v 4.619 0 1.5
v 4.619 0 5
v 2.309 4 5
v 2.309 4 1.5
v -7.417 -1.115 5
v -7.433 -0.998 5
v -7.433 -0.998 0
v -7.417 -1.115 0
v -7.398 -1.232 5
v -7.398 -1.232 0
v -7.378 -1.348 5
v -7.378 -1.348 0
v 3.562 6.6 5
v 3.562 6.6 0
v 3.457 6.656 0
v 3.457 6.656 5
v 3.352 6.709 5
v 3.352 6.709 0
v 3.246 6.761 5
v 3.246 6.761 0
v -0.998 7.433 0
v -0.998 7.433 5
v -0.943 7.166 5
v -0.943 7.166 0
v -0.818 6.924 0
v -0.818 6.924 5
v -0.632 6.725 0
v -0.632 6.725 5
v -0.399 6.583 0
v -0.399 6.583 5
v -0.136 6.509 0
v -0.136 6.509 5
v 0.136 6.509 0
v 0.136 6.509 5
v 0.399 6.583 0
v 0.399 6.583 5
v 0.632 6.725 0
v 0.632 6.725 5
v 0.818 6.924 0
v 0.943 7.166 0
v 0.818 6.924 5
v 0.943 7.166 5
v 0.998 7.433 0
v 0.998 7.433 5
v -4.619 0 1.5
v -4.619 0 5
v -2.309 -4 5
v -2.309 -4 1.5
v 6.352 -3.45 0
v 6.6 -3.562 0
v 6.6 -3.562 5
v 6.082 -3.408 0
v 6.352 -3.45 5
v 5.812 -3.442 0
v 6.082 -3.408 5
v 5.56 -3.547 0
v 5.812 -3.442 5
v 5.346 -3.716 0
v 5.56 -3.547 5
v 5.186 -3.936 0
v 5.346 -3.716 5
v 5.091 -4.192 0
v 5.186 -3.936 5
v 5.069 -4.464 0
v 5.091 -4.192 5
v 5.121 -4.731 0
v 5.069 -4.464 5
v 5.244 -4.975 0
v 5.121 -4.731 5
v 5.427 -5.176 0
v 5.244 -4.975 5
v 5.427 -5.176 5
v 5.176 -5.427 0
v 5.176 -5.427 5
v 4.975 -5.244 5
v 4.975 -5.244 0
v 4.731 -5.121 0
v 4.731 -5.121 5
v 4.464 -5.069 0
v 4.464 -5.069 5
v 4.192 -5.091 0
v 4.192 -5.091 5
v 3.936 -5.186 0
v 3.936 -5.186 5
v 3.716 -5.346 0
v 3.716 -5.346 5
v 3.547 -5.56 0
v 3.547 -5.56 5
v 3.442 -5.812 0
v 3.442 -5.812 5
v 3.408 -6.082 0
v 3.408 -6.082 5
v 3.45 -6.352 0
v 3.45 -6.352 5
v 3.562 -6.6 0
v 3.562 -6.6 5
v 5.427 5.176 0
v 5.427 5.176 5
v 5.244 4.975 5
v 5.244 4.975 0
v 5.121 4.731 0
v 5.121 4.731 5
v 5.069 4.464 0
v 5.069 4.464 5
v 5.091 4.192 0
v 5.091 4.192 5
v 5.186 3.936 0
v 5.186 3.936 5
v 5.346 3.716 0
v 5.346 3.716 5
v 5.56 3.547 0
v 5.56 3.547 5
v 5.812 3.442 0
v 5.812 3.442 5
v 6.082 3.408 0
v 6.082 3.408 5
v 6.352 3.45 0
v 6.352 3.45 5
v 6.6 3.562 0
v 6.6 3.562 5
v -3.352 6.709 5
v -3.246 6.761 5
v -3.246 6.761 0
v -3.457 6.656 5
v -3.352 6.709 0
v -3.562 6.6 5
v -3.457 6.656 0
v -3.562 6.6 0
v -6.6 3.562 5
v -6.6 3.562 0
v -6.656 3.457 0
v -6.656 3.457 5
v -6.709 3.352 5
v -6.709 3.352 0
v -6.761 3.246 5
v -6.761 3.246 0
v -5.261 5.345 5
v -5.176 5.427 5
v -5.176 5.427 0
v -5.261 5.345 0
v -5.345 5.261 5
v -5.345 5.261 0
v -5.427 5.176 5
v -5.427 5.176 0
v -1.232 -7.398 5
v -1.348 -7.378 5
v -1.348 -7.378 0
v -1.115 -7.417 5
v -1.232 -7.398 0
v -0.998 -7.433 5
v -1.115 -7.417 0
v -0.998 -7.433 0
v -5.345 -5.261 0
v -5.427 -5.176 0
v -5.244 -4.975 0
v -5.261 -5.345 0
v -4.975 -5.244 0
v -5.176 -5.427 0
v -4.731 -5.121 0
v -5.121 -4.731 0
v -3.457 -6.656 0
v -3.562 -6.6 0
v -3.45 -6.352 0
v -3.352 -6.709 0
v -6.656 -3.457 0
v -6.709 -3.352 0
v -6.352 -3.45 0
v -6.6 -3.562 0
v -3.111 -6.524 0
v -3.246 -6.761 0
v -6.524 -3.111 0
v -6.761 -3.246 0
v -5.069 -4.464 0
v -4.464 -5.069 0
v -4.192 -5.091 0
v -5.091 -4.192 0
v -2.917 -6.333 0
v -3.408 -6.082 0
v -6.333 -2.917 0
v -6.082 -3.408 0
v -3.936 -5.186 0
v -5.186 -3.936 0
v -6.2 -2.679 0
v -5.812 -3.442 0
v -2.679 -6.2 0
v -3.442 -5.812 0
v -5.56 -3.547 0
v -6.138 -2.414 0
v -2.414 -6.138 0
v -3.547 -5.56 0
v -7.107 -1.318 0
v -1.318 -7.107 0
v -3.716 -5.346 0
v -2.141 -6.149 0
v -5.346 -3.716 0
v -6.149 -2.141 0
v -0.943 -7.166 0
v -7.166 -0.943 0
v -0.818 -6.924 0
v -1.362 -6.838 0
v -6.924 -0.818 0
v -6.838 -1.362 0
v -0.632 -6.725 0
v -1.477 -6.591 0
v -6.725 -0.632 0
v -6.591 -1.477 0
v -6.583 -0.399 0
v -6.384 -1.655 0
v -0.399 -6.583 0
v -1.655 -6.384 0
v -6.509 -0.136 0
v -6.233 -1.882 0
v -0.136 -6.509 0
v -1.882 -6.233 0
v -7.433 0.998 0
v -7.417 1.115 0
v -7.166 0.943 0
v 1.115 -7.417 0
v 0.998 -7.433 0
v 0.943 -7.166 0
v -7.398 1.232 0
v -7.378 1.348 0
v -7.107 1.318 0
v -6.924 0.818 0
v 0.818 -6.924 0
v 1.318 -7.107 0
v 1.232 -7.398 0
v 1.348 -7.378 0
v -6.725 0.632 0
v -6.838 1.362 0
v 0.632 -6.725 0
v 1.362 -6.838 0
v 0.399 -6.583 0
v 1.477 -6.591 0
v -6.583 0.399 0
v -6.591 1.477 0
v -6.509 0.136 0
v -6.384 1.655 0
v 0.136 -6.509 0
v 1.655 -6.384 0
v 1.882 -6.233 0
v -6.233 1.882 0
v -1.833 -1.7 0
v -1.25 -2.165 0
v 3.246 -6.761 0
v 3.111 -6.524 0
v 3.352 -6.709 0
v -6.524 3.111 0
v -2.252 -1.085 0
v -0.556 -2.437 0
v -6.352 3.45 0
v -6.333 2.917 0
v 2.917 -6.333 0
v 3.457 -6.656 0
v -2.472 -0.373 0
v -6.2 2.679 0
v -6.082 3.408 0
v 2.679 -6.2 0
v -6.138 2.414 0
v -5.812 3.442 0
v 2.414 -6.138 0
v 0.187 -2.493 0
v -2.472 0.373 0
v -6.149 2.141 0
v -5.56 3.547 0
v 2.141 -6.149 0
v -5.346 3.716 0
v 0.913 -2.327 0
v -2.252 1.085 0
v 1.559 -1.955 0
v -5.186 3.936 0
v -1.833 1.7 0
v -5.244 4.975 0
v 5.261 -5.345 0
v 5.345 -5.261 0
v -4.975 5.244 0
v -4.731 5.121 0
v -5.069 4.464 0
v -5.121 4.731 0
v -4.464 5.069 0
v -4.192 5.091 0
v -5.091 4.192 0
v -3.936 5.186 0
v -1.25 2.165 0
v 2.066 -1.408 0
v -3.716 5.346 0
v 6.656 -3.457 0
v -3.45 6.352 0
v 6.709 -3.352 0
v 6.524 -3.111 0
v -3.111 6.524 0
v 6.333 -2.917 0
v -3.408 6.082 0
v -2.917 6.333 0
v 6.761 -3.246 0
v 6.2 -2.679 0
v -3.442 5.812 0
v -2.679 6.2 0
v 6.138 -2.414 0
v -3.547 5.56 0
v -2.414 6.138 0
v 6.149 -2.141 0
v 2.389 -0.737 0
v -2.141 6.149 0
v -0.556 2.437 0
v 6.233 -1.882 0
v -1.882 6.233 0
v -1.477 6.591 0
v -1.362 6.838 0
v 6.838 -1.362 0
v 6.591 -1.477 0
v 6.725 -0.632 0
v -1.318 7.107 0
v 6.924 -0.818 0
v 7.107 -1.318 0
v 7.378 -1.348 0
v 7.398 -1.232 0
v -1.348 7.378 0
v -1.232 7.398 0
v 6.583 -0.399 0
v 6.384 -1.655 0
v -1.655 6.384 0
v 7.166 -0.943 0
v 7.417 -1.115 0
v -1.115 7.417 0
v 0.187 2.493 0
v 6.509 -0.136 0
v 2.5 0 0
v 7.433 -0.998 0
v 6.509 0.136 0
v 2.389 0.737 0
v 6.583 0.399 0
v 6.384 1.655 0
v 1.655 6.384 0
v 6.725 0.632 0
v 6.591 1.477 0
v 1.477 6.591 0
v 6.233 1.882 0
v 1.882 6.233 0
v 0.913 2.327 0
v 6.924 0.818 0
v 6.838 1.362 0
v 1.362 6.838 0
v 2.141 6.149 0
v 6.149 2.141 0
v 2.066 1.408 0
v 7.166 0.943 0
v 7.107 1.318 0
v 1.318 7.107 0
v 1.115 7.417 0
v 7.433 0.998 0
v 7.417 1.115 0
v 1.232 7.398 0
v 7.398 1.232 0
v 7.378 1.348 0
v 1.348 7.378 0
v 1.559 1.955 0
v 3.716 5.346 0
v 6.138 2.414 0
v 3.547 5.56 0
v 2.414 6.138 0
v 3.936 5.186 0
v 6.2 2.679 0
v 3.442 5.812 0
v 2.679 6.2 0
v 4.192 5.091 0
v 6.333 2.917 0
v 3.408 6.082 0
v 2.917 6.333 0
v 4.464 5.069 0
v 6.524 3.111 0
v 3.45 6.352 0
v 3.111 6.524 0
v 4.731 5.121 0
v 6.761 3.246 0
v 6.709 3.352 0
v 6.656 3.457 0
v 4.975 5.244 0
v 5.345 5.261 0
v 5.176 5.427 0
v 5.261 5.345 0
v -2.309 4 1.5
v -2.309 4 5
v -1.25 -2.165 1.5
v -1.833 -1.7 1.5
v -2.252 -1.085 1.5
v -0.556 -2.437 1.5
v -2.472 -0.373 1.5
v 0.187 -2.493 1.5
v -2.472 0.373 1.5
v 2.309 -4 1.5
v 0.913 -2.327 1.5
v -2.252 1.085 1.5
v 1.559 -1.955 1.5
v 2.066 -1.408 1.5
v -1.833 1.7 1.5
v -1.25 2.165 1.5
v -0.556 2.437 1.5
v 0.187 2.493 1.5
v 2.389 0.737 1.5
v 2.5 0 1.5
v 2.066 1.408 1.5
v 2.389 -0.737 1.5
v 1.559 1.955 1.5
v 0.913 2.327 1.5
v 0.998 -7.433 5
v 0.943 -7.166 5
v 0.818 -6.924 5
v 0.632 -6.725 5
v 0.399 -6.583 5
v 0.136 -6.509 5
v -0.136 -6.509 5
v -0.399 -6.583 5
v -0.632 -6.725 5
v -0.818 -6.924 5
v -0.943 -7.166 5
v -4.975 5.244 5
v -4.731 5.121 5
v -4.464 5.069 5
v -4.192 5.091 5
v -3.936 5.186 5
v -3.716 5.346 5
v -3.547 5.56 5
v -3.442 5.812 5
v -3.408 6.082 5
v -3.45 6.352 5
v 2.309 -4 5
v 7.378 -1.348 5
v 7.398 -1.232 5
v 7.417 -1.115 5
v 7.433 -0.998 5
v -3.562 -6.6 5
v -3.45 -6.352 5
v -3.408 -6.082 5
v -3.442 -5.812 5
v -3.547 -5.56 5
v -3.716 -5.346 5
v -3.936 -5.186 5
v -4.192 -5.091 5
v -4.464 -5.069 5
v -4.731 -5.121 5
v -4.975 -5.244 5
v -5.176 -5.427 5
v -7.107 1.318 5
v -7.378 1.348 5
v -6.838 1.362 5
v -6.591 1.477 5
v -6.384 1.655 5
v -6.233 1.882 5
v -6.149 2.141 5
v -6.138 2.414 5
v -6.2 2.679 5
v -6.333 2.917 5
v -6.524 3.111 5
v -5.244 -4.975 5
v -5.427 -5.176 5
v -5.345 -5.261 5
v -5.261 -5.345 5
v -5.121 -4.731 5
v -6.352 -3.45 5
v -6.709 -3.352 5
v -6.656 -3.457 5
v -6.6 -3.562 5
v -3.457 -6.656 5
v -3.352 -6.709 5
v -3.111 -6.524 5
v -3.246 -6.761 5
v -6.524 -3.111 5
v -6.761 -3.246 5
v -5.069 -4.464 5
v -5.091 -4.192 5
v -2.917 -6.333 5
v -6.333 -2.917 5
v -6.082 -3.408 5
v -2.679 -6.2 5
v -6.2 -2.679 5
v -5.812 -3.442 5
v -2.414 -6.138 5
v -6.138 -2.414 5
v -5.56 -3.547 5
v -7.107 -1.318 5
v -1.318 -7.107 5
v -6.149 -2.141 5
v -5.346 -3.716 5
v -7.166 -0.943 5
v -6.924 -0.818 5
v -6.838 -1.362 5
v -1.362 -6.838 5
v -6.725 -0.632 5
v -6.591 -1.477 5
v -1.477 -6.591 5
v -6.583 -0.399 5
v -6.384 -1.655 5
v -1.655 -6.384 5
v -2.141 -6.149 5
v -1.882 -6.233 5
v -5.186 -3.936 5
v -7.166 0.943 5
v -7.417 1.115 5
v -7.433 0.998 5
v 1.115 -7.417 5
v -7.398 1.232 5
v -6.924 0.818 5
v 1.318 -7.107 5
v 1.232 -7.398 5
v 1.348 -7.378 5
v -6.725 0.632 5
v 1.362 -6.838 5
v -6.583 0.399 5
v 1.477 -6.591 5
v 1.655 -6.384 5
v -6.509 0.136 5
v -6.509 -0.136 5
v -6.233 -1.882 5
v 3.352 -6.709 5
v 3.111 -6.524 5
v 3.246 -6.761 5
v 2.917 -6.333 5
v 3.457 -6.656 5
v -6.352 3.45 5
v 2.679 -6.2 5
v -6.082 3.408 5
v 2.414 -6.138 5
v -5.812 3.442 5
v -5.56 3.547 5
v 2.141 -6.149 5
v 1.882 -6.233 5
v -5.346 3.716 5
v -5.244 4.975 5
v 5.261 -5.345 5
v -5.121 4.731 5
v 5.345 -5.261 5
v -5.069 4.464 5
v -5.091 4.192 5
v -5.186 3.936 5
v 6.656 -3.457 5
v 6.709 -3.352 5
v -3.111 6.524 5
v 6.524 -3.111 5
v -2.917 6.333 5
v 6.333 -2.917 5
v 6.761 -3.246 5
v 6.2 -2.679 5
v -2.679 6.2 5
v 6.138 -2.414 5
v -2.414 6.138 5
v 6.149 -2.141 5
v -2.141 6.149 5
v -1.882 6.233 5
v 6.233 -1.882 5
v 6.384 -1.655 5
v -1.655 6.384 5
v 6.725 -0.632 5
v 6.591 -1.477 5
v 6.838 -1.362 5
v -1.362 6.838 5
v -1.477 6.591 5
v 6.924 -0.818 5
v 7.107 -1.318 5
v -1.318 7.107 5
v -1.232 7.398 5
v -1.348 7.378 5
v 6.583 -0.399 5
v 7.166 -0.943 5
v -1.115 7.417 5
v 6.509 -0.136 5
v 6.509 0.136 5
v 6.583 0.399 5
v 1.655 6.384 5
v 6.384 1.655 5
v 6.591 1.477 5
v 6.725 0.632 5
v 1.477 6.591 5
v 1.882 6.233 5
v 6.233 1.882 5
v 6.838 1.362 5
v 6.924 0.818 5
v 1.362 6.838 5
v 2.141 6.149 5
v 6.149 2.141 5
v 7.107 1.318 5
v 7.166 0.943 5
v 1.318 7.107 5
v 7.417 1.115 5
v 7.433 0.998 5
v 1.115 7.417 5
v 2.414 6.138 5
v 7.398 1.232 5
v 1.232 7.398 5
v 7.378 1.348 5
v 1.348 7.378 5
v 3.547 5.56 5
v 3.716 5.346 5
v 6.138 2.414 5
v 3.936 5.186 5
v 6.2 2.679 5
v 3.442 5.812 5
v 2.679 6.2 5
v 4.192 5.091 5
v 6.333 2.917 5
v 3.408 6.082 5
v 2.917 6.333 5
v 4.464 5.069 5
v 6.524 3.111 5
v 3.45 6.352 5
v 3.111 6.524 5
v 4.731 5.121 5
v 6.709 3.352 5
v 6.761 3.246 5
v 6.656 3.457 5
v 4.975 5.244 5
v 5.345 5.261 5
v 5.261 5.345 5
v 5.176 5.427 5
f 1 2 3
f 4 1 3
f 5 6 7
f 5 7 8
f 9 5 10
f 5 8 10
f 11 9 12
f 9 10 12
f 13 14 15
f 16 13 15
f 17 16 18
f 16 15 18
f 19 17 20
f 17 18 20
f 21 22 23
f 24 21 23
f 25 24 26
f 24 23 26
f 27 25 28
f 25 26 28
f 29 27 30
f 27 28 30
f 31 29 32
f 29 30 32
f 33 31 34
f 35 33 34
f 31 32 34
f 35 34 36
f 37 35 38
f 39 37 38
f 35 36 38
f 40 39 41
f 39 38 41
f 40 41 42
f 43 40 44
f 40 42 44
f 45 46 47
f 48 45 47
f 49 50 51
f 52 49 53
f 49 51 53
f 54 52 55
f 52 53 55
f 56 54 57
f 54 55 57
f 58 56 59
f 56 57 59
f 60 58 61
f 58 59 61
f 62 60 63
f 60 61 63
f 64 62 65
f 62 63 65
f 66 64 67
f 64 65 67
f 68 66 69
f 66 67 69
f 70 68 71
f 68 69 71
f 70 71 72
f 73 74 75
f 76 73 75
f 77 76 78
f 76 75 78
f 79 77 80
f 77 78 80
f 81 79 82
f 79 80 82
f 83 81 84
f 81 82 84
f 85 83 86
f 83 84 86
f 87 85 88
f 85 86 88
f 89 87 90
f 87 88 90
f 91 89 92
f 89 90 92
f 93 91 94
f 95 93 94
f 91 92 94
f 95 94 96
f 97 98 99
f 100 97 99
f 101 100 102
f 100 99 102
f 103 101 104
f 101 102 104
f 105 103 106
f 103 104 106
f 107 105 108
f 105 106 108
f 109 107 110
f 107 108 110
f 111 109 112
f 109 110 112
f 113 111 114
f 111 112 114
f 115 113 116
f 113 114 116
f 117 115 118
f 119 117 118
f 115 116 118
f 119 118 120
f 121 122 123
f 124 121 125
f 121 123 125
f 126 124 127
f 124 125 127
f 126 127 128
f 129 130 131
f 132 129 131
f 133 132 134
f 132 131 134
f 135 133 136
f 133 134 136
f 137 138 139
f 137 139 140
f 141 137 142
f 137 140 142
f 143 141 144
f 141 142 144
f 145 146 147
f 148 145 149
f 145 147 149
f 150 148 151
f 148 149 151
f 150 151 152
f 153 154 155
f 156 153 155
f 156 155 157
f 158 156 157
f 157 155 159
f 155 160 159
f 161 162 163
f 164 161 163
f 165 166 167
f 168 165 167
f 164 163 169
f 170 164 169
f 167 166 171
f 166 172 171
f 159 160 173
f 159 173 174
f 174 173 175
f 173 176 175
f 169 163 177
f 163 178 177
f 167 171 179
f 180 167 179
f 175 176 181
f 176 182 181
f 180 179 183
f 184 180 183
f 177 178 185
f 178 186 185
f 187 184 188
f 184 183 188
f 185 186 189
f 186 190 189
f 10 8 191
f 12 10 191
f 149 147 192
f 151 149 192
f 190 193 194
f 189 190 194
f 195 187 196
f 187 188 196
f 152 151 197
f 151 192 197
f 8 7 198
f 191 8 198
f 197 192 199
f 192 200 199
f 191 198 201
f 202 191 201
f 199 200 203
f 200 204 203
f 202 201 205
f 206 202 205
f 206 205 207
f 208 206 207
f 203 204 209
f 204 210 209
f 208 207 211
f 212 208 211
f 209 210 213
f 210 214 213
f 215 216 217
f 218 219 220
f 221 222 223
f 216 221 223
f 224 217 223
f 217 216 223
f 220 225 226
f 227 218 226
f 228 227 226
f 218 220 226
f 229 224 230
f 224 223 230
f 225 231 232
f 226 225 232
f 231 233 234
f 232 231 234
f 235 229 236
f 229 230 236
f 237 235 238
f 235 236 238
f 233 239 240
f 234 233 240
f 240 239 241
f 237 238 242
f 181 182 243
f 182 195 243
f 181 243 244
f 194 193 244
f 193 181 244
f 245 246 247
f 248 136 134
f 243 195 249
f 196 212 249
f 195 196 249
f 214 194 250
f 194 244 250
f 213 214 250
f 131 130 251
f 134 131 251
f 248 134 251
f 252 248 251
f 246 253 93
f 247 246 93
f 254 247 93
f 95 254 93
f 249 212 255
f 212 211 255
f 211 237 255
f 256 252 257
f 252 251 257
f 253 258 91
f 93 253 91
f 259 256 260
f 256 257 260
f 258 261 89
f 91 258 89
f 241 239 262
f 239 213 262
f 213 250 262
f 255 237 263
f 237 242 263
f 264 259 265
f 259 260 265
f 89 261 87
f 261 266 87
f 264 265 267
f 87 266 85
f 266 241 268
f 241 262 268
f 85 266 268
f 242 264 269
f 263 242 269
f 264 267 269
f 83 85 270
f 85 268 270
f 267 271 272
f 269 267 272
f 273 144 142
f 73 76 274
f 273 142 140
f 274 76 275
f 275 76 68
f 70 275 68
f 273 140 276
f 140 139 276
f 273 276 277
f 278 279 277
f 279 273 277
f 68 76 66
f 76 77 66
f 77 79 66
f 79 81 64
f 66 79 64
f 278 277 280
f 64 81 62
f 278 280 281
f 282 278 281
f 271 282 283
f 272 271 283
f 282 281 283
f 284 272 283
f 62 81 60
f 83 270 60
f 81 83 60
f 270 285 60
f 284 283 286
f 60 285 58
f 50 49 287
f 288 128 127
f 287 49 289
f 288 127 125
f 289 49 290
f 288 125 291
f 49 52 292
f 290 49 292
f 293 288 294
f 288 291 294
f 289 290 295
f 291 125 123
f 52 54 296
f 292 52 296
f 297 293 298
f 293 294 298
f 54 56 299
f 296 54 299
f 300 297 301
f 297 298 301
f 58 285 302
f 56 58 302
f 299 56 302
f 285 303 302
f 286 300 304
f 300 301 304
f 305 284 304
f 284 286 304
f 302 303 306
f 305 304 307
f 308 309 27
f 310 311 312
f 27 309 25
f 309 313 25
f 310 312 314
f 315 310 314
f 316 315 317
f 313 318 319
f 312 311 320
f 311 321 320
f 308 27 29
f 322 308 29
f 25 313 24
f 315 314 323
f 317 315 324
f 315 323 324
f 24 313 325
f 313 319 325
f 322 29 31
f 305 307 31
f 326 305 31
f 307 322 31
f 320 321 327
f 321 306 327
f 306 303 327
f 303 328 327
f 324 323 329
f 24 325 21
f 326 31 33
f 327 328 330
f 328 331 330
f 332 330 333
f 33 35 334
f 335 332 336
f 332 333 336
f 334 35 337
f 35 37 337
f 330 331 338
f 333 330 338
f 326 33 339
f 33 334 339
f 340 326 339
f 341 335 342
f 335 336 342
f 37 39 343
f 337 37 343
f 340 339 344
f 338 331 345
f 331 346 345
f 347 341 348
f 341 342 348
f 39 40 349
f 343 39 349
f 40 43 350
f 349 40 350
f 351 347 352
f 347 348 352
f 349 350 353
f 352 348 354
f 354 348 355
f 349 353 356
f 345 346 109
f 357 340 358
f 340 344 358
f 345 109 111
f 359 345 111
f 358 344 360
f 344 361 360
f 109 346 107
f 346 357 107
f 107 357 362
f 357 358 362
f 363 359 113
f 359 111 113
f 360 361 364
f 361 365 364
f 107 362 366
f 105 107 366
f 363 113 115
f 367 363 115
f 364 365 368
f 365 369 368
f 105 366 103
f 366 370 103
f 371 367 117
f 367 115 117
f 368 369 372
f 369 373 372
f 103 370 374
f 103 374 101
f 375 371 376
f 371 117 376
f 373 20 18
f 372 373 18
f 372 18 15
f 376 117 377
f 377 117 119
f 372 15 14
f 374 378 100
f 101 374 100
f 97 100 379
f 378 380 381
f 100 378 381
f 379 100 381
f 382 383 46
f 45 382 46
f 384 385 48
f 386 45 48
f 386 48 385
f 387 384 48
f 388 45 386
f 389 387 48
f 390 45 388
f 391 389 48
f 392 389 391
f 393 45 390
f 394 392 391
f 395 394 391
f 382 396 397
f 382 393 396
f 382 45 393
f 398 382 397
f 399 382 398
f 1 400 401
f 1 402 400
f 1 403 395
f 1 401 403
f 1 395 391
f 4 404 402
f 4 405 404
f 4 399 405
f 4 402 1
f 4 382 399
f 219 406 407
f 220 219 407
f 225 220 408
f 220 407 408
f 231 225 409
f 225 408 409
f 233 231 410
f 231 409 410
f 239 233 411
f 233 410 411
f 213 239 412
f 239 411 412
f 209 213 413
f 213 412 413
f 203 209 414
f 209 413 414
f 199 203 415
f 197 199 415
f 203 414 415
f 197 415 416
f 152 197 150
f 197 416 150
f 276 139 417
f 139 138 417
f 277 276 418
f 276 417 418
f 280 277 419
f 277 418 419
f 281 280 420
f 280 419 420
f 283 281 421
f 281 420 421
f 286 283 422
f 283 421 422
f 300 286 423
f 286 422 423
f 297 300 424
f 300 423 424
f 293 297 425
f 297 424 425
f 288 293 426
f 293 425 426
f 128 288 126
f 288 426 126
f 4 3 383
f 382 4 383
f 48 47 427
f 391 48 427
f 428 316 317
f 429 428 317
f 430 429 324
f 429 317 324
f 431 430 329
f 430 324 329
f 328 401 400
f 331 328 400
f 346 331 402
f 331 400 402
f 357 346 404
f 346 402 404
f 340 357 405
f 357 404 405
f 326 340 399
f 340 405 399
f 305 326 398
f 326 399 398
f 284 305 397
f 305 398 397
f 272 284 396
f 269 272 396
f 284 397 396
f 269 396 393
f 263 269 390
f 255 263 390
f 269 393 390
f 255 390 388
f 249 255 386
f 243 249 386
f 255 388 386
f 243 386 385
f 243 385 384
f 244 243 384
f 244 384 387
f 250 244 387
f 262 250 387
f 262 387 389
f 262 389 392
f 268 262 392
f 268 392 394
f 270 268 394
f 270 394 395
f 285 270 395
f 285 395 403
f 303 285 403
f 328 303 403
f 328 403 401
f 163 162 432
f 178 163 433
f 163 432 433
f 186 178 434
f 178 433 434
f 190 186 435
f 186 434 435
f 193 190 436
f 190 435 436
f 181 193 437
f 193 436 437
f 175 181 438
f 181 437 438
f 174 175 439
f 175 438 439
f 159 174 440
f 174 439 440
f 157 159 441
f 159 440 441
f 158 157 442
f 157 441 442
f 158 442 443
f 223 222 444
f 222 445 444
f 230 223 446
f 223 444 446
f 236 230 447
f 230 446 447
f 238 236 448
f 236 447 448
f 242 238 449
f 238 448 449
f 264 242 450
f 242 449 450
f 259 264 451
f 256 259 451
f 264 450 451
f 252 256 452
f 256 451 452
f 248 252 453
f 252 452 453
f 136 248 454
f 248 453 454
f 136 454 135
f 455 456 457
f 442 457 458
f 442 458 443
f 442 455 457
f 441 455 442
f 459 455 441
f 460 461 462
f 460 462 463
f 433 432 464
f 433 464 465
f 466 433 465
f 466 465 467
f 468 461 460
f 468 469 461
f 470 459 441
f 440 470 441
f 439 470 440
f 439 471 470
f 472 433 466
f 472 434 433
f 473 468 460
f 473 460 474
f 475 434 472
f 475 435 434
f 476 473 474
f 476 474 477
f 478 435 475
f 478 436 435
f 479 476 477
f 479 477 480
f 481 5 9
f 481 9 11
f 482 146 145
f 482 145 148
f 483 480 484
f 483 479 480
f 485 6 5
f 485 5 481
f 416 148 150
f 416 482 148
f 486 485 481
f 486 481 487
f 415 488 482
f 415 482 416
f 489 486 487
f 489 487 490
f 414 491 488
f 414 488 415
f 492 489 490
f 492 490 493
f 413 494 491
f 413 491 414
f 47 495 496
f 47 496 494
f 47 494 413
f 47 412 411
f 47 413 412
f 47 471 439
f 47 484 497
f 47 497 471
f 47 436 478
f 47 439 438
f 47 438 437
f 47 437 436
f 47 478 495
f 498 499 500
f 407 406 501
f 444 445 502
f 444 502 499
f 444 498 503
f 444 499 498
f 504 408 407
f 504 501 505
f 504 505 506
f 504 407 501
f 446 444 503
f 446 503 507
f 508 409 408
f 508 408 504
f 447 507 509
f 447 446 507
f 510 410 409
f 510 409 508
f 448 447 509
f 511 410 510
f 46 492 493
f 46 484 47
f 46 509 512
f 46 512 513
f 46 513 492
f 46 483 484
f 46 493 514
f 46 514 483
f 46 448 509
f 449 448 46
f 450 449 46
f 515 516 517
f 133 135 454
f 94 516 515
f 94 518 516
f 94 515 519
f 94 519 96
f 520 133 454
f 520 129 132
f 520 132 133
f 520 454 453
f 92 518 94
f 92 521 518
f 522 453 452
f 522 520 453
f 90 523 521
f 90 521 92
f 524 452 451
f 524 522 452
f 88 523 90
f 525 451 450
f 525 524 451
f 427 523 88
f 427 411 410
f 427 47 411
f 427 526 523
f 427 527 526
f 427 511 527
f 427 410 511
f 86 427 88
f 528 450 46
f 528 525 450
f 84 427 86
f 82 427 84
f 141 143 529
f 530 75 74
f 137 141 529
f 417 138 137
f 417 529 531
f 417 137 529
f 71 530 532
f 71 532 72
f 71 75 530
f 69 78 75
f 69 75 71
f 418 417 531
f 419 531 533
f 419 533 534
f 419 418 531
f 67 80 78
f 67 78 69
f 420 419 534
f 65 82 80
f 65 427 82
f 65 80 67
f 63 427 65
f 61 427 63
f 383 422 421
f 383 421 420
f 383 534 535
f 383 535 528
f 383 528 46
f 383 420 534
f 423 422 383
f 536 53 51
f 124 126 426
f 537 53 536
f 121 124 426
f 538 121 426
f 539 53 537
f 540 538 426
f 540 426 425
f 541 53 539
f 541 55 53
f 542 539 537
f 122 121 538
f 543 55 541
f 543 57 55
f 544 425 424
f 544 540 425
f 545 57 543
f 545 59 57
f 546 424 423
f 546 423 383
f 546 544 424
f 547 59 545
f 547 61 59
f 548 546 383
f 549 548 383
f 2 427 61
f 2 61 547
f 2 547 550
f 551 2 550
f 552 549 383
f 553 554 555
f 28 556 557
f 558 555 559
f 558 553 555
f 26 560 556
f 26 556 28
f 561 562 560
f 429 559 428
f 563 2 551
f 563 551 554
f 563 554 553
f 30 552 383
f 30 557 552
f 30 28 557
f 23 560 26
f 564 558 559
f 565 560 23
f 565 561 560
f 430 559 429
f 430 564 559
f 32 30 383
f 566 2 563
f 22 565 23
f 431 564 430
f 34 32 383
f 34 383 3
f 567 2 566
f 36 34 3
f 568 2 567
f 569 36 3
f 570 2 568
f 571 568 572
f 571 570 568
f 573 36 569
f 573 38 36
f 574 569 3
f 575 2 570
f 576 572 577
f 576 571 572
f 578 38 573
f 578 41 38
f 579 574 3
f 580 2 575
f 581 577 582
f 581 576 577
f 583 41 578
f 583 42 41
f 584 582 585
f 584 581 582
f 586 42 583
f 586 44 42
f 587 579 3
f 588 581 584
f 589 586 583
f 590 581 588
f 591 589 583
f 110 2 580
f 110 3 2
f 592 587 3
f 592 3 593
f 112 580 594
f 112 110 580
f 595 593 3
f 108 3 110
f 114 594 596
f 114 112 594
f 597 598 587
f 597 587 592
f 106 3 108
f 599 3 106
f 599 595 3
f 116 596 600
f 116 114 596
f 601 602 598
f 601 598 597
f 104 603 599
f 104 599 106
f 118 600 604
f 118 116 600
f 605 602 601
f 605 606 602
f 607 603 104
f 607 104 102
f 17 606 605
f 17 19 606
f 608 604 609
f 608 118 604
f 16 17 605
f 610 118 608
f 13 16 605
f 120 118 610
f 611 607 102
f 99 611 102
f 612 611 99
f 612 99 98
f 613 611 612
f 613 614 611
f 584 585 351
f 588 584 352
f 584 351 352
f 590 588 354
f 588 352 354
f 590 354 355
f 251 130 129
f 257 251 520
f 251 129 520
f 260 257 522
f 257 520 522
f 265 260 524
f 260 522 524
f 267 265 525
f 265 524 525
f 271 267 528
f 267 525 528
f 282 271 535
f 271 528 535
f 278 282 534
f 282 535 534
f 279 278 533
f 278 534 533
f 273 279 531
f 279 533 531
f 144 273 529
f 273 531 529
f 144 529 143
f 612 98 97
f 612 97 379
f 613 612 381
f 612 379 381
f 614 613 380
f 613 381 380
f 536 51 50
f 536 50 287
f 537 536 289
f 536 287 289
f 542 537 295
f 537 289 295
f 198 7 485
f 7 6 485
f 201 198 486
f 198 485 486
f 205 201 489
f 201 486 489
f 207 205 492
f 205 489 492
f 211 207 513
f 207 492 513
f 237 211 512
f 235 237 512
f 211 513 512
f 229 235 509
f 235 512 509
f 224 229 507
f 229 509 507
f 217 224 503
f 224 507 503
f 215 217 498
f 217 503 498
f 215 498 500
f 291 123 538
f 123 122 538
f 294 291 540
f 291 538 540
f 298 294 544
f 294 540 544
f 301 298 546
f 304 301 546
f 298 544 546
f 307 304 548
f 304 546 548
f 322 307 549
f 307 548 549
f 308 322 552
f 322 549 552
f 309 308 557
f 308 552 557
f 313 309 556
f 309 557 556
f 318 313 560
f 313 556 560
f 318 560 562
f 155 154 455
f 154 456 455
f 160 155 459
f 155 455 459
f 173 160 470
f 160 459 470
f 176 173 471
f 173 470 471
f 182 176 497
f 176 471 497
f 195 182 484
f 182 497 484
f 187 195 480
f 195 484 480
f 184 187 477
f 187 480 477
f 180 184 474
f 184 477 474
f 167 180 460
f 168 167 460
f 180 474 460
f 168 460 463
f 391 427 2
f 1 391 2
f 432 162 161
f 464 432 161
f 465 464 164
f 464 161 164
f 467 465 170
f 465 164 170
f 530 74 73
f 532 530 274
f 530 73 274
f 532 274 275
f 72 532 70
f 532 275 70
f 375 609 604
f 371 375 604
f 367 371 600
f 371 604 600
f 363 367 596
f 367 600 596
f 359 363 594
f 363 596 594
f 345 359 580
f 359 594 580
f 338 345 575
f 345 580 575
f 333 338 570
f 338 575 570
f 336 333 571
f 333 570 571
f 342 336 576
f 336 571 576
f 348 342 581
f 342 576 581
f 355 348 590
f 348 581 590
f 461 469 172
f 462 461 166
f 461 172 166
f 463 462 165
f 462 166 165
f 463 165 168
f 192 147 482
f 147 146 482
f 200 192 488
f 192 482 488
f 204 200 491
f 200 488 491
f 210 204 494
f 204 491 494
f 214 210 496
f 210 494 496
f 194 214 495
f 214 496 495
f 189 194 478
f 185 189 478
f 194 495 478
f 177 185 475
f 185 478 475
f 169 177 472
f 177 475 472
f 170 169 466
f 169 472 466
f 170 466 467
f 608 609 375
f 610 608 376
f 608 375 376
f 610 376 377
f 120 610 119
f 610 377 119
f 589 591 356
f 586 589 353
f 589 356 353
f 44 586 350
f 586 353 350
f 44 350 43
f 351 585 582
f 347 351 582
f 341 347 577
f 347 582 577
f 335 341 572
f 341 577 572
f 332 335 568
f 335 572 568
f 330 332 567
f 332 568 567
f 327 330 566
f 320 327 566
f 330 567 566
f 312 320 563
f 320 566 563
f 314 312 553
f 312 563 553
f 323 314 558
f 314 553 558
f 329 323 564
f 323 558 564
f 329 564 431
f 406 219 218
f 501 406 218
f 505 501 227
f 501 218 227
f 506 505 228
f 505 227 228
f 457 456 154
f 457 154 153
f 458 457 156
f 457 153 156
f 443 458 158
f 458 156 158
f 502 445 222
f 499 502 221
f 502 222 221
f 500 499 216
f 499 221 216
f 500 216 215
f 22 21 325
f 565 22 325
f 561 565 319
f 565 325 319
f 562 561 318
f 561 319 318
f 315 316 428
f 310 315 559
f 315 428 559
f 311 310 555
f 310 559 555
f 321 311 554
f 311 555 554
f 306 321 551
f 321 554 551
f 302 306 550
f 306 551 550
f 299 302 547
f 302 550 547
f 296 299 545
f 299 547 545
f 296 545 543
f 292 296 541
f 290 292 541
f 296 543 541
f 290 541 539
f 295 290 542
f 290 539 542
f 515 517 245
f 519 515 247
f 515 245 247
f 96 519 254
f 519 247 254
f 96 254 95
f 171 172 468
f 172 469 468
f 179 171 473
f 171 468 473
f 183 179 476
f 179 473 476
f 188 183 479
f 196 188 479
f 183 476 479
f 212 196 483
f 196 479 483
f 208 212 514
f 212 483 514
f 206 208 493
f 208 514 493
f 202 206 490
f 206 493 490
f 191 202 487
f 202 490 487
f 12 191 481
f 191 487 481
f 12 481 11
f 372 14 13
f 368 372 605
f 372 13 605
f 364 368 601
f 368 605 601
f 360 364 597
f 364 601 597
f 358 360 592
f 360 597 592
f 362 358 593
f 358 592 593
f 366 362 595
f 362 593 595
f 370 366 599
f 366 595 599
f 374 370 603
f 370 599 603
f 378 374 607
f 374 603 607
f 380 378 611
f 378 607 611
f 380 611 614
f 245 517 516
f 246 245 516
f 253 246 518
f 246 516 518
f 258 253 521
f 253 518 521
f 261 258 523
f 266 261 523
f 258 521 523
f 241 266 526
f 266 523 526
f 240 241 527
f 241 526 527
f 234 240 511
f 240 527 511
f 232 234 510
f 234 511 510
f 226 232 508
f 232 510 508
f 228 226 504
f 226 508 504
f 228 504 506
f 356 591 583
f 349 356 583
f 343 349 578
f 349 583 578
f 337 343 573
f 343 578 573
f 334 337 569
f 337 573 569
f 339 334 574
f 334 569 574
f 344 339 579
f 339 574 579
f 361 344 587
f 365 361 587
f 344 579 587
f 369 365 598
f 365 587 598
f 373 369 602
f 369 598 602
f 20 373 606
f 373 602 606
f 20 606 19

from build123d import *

# Parameters (mm, degrees)
F0_R     = 7.5
F1_DEPTH = 5
F2_R     = 1
F2_R_2   = 2.5
F3_DEPTH = 25
F5_DEPTH = 3.5


with BuildPart() as f1:
    # F0 (on Top) → F1 (new body)
    with BuildSketch(Plane.XY):
        Circle(F0_R)
    extrude(amount=F1_DEPTH)

    # F2 (on face) → F3 (cut)
    with BuildSketch(Plane.XY.offset(5)):
        with Locations((0, 7.5)):
            Circle(F2_R)
        Circle(F2_R_2)
        with Locations((-2.317627, 7.132924)):
            Circle(F2_R)
        with Locations((-4.408389, 6.067627)):
            Circle(F2_R)
        with Locations((-6.067627, 4.408389)):
            Circle(F2_R)
        with Locations((-7.132924, 2.317627)):
            Circle(F2_R)
        with Locations((-7.5, 0)):
            Circle(F2_R)
        with Locations((-7.132924, -2.317627)):
            Circle(F2_R)
        with Locations((-6.067627, -4.408389)):
            Circle(F2_R)
        with Locations((-4.408389, -6.067627)):
            Circle(F2_R)
        with Locations((-2.317627, -7.132924)):
            Circle(F2_R)
        with Locations((0, -7.5)):
            Circle(F2_R)
        with Locations((2.317627, -7.132924)):
            Circle(F2_R)
        with Locations((4.408389, -6.067627)):
            Circle(F2_R)
        with Locations((6.067627, -4.408389)):
            Circle(F2_R)
        with Locations((7.132924, -2.317627)):
            Circle(F2_R)
        with Locations((7.5, 0)):
            Circle(F2_R)
        with Locations((7.132924, 2.317627)):
            Circle(F2_R)
        with Locations((6.067627, 4.408389)):
            Circle(F2_R)
        with Locations((4.408389, 6.067627)):
            Circle(F2_R)
        with Locations((2.317627, 7.132924)):
            Circle(F2_R)
    extrude(amount=-F3_DEPTH, mode=Mode.SUBTRACT)

    # F4 (on face) → F5 (cut)
    with BuildSketch(Plane.XY.offset(5)):
        Polygon((-2.309401, -4), (2.309401, -4), (4.618802, 0), (2.309401, 4), (-2.309401, 4), (-4.618802, 0), align=None)
    extrude(amount=-F5_DEPTH, mode=Mode.SUBTRACT)


solid = f1.part
